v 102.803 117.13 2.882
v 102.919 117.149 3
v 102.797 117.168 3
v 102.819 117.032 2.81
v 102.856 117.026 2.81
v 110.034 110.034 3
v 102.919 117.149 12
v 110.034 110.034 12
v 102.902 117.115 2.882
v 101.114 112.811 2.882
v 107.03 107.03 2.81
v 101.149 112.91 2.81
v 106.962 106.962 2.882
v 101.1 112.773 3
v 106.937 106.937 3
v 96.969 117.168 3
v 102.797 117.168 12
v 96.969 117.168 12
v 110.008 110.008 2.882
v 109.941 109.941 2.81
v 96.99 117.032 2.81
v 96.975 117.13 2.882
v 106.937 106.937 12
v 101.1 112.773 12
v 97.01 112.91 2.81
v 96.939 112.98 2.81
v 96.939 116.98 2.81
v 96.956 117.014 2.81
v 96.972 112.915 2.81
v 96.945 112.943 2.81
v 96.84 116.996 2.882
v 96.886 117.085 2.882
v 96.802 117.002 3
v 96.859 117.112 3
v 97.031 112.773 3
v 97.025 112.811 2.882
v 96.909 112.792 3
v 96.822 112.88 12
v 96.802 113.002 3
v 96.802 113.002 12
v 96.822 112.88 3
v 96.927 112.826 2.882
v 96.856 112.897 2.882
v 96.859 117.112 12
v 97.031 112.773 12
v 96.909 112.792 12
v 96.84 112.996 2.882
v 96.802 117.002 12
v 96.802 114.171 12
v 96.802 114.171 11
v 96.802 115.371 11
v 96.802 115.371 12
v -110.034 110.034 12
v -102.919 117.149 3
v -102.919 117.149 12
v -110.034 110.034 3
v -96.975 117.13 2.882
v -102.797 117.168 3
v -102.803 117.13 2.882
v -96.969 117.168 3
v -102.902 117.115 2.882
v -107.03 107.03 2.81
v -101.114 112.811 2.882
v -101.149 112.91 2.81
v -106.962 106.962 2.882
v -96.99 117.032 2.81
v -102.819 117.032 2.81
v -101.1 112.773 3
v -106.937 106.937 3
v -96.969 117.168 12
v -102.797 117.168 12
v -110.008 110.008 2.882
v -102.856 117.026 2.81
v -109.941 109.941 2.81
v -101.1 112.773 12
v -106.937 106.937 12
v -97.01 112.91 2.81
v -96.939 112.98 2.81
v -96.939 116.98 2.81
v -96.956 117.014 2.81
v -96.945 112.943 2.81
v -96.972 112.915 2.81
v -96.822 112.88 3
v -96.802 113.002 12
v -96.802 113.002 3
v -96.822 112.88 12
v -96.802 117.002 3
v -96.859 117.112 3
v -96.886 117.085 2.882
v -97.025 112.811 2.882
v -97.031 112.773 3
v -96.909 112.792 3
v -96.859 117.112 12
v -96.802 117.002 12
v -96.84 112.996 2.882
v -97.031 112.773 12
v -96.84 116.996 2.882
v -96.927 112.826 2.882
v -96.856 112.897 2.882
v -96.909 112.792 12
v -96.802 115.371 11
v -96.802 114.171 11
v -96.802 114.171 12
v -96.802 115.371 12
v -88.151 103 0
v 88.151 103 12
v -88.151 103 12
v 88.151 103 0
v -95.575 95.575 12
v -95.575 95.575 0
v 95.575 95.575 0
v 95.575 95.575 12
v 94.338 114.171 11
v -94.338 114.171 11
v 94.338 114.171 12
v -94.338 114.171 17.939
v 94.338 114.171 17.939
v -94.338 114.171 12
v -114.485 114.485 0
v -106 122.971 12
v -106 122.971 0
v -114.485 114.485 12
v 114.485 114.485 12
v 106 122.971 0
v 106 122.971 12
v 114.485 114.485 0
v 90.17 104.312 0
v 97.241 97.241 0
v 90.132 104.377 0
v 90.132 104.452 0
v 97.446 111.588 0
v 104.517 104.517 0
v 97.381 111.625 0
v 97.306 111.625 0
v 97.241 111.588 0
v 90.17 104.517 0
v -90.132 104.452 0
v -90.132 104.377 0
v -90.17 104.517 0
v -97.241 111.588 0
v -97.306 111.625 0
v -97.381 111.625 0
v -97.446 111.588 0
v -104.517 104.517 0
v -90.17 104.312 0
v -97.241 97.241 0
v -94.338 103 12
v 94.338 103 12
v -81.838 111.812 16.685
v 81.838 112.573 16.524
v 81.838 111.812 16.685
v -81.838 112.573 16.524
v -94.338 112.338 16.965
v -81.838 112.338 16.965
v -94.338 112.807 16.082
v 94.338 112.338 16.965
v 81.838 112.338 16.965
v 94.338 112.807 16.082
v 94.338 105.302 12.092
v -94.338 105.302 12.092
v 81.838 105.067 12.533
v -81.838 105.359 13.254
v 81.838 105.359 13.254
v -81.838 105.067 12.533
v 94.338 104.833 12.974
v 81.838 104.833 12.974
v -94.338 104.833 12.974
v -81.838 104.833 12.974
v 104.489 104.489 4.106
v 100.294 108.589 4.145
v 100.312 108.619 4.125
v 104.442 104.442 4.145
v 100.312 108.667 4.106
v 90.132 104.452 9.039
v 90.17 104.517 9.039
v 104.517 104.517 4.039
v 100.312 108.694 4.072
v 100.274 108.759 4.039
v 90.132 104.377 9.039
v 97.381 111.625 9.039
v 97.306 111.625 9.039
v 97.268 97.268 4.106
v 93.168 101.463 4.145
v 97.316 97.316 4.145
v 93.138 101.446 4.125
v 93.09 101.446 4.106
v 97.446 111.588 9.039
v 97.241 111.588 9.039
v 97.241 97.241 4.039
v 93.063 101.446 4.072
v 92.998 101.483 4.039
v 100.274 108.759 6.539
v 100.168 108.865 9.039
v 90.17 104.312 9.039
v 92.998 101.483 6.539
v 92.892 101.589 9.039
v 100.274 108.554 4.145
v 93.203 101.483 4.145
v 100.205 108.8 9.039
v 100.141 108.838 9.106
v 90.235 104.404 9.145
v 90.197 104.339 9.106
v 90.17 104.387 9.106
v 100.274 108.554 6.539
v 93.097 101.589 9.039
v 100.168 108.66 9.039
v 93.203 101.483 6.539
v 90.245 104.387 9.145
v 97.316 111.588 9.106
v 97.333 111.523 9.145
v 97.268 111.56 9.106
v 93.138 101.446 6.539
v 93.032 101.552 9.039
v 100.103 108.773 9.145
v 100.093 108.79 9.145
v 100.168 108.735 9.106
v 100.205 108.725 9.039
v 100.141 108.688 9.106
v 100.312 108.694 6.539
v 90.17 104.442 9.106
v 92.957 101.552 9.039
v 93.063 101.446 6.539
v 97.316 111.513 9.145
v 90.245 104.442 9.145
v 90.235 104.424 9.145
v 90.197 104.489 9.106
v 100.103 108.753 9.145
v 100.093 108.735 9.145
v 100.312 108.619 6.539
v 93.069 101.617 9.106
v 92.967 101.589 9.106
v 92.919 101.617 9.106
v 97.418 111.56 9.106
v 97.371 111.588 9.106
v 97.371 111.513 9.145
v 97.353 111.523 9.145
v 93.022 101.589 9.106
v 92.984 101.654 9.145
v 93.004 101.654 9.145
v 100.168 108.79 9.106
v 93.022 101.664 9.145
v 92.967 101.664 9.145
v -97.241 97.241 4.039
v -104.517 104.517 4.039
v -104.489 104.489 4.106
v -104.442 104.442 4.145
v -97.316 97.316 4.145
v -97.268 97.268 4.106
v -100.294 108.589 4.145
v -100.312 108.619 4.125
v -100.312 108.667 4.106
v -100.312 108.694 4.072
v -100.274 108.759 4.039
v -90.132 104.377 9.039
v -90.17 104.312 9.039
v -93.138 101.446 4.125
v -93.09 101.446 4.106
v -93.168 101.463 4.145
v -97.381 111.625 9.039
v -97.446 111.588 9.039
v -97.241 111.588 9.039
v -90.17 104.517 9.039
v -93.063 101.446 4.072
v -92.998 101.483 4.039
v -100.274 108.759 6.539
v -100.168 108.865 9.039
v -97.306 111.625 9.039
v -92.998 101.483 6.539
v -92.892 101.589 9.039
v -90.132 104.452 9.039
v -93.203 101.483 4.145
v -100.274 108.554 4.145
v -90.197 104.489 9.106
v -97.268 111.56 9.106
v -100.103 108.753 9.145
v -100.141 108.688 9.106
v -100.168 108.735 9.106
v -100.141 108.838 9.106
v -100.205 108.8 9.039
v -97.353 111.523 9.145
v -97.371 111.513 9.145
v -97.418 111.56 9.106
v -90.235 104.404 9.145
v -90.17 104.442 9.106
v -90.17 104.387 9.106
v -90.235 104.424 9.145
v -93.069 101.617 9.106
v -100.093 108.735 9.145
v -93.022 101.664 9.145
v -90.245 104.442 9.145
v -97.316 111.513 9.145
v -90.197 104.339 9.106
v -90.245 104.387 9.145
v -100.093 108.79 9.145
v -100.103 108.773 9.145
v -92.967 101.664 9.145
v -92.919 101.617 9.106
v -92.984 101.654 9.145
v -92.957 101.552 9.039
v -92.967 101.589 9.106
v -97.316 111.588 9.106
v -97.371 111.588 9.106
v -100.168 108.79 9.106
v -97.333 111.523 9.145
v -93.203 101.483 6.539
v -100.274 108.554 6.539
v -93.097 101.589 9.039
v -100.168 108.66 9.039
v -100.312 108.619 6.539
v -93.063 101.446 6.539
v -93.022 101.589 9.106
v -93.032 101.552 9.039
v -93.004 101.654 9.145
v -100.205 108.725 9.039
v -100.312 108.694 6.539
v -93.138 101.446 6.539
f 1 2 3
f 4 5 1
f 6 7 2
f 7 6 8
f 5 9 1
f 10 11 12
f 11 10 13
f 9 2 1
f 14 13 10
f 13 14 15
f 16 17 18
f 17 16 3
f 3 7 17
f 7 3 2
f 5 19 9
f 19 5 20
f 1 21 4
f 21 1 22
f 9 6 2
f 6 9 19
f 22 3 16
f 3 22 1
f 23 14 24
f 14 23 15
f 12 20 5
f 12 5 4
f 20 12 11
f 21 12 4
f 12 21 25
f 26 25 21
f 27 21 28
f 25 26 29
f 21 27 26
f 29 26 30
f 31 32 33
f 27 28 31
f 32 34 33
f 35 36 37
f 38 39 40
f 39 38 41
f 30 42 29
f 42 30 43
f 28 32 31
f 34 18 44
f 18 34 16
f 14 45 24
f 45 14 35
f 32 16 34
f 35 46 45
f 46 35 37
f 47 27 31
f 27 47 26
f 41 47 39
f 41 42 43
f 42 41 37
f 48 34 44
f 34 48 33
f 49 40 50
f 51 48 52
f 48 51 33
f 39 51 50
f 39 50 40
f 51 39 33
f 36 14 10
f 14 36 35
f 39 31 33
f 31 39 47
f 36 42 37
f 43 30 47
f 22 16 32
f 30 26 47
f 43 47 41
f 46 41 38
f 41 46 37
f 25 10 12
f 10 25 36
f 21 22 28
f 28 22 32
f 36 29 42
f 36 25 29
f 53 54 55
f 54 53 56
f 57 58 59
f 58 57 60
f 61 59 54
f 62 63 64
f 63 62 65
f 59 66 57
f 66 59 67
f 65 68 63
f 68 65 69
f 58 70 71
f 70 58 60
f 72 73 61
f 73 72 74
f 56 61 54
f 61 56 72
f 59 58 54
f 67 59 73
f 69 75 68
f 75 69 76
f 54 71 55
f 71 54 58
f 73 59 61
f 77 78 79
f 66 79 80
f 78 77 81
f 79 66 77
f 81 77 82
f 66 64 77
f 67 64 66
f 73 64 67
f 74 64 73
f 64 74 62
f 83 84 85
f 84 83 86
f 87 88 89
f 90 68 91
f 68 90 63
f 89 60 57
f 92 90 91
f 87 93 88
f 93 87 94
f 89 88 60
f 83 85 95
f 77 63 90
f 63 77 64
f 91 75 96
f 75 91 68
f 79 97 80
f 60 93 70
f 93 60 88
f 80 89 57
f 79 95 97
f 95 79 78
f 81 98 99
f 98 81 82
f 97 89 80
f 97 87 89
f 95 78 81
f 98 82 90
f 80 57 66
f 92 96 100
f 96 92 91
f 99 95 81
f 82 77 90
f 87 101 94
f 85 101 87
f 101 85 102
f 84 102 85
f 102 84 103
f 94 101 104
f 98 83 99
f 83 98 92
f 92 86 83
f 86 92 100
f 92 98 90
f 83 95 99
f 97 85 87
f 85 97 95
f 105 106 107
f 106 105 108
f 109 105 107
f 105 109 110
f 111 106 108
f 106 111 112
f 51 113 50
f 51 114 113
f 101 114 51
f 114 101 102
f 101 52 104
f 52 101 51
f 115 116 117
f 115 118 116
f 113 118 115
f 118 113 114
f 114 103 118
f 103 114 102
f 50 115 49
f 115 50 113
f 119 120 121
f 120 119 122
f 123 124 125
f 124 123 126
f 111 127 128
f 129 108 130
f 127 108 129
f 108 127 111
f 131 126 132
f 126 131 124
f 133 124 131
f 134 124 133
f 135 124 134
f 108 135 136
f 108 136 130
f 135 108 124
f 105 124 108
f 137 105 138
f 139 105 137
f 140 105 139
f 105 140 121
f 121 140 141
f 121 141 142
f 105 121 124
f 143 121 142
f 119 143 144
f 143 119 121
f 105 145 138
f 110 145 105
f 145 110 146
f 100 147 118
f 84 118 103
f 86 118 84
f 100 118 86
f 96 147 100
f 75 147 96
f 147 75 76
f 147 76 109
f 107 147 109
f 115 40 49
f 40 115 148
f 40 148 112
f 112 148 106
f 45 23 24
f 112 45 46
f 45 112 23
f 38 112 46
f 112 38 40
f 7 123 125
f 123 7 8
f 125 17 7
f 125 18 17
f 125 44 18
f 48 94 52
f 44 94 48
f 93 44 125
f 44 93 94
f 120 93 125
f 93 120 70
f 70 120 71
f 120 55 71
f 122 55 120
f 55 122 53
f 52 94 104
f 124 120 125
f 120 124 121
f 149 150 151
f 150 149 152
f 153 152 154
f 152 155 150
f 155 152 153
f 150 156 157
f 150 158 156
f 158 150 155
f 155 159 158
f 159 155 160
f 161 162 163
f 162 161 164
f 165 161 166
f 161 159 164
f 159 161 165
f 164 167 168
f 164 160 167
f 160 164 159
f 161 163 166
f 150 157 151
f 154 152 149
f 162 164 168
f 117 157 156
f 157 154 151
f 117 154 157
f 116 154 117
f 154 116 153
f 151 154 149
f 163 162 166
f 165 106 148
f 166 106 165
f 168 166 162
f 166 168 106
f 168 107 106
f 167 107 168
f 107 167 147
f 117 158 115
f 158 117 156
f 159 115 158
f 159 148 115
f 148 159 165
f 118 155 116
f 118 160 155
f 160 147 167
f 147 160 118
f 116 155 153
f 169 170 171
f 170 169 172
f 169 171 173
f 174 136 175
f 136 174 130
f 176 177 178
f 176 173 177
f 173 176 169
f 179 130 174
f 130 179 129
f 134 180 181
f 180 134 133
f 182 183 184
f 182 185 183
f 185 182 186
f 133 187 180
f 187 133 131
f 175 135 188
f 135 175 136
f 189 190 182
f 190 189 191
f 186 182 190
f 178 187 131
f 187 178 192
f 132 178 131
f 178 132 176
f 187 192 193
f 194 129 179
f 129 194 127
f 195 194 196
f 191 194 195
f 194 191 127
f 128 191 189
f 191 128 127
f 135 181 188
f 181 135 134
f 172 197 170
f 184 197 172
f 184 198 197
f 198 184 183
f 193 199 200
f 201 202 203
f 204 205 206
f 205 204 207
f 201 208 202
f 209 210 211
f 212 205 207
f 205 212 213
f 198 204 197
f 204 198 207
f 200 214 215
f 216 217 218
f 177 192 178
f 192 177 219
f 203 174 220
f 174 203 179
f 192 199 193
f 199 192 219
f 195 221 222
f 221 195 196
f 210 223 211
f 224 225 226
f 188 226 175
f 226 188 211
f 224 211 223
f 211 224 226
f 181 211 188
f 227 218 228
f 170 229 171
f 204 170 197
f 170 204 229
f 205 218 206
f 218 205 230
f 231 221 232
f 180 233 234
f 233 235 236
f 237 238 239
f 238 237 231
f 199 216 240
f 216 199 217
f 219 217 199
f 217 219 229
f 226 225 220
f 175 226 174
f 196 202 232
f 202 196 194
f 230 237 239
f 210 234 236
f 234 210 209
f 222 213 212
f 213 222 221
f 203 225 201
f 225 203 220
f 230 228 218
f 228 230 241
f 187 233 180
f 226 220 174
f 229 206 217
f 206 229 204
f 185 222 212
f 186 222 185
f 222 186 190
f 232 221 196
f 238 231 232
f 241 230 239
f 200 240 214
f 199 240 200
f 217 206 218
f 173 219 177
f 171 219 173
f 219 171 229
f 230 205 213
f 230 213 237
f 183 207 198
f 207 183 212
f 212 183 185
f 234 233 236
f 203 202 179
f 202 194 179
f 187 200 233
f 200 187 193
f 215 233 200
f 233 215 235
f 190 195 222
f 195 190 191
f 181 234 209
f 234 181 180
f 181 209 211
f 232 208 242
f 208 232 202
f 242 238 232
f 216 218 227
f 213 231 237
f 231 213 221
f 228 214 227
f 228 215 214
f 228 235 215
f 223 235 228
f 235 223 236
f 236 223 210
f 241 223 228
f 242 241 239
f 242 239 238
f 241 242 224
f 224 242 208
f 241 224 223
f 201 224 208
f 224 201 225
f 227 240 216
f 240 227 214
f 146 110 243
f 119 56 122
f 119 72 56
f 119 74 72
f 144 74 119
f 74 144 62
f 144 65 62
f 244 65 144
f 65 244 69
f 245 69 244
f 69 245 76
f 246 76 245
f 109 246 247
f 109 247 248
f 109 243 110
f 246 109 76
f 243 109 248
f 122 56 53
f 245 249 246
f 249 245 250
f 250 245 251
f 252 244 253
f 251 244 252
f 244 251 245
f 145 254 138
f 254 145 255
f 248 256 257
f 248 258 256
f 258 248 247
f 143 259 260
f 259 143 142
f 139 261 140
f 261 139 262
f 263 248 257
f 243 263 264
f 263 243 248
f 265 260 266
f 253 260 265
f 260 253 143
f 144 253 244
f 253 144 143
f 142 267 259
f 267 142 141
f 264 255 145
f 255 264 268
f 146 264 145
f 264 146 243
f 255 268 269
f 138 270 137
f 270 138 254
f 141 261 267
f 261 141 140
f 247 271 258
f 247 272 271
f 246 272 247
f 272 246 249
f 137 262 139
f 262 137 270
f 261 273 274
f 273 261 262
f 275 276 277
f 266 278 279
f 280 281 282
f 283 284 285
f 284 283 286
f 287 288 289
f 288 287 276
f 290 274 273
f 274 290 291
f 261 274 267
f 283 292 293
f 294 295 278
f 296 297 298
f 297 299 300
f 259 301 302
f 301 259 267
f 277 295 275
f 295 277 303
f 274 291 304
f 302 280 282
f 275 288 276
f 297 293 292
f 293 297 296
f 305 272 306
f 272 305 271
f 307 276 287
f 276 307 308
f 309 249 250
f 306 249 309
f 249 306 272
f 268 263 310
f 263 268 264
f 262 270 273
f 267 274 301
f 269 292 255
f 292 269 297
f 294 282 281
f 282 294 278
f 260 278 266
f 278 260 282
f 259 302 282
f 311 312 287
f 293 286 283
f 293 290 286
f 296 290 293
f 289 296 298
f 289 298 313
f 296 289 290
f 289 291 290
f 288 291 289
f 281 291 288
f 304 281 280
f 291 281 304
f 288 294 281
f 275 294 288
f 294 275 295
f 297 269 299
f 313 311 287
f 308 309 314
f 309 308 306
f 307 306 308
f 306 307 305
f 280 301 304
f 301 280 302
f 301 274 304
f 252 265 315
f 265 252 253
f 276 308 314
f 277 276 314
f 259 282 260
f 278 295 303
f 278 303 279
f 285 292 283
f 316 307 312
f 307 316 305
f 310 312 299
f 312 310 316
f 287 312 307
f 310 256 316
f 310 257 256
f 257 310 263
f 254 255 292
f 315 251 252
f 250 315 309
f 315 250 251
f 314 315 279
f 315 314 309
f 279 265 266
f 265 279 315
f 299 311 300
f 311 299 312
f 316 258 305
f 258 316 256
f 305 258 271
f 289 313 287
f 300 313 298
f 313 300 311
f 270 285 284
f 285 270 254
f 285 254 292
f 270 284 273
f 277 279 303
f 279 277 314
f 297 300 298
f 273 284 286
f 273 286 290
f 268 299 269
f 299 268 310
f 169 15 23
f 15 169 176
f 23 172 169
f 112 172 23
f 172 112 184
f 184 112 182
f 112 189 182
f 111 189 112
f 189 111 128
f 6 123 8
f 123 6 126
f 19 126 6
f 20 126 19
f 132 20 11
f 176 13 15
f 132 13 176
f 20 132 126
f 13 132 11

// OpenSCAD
strip_thickness_mm = 0.5;
strip_width_mm = 8.5;
strip_retention_wall_mm = 1.5;
strip_retention_wall_angle = 40;
strip_separation_mm = 1;
strip_depth_mm = 1;
bracket_width_mm = strip_width_mm * 2 + 3 * strip_separation_mm;
bracket_depth_mm = 4;
mirror_thickness_mm = 1.2;
mirror_retention_depth_mm = 3;
mirror_retention_inset_mm = 1.2;
slot_tolerance_mm = 0.4;
mirror_width_mm = 200;

mirror_retention_block_width_mm = mirror_retention_depth_mm + bracket_depth_mm / sqrt(2);
corner_piece_offset_mm = bracket_width_mm / 2 - bracket_depth_mm / 2 + (mirror_retention_block_width_mm - mirror_retention_depth_mm) * sqrt(2);
corner_piece_inset_mm = 6;
floor_inset_mm = 38;
base_chamfer_height_mm = 12;
top_corner_chamfer_mm = 12;
top_pin_area_mm = 21;
corner_piece_hole_depth_mm = 8;
lid_retention_thickness_mm = 2.5;
floor_size_mm = 201;
ceiling_size_mm = floor_size_mm + 2 * lid_retention_thickness_mm;
top_thickness_mm = corner_piece_hole_depth_mm + 4;

horizontal_bracket_length_mm = 7.625 * 25.4;
horizontal_bracket_retention_width_mm = 6 * 25.4;
horizontal_bracket_retention_wall_thickness_mm = 2.5;
horizontal_bracket_retention_tolerance_mm = 0.3;

pin_width_mm = 10;
pin_depth_mm = 8;
pin_inset_mm = 10;
pin_thickness_mm = 4;
pin_top_thickness_mm = 3;
pin_insertion_easing_mm = 0.6;

pin_insertion_depth_mm = pin_depth_mm - pin_top_thickness_mm;
pin_insertion_tolerance_mm = 0.3;

pin_insertion_extra_mm = 1;

module strip_retention(side, height_mm, top_escape_mm, bottom_escape_mm, strip_depth_mm = strip_depth_mm)
{
  strip_offset = 0.5 * (strip_width_mm + strip_separation_mm);

  translate([side * strip_offset, -0.5 * bracket_depth_mm + 0.5 * strip_thickness_mm + strip_depth_mm, 0])
  {
    translate([0, 0, height_mm * 0.5])
    cube([strip_width_mm, strip_thickness_mm, height_mm + 5], center = true);

    translate([0, -0.5 * bracket_depth_mm, height_mm * 0.5])
    cube([strip_width_mm - 2 * strip_retention_wall_mm, bracket_depth_mm, height_mm + 5], center = true);

    difference()
    {
      union()
      for (j = [-1, 1])
      {
        intersection()
        {
          translate([j * (0.5 * strip_width_mm - 0.5 * strip_retention_wall_mm), 0.5 * strip_retention_wall_mm - 0.5 * strip_thickness_mm, height_mm * 0.5])
          multmatrix(
            [[1, 0, 0, 0],
             [j * strip_retention_wall_skew_factor, 1, 0, -0.5 * strip_retention_wall_x_mm],
             [0, 0, 1, 0],
             [0, 0, 0, 1]])
          cube([strip_retention_wall_mm + 0.1, strip_retention_wall_mm, height_mm + 10], center = true);

          translate([0, -3 * bracket_depth_mm + 0.5 * strip_thickness_mm, height_mm * 0.5 + 10])
          cube([strip_width_mm, 6 * bracket_depth_mm, height_mm + 20], center = true);
        }
      }

      translate([0, 3 * bracket_depth_mm + 0.5 * strip_thickness_mm, 0])
      cube([5 * strip_width_mm, 6 * bracket_depth_mm, 5 * height_mm], center = true);
    }

    translate([-side * 0.25 * strip_width_mm, -1.5 * strip_thickness_mm, height_mm - 0.5 * top_escape_mm])
    cube([strip_width_mm, 2 * strip_thickness_mm, top_escape_mm], center = true);

    translate([-side * 0.25 * strip_width_mm, -1.5 * strip_thickness_mm, 0.5 * bottom_escape_mm])
    cube([strip_width_mm, 2 * strip_thickness_mm, bottom_escape_mm], center = true);
  }
}

module pin()
{
  difference()
  {
    cube([2 * pin_inset_mm, pin_width_mm, pin_depth_mm], center = true);
    
    translate([0, 0, -pin_top_thickness_mm])
    cube([2 * pin_inset_mm - 2 * pin_thickness_mm, pin_width_mm * 2, pin_depth_mm], center = true);

    for (i = [-1, 1])
    {
      translate([-i * (pin_inset_mm - pin_thickness_mm * 1.5), 0, 0.5 * pin_insertion_depth_mm - 0.5 * pin_depth_mm])
      multmatrix(
        [[1, 0, i * pin_insertion_easing_mm / (2 * pin_insertion_depth_mm), 0],
         [0, 1, 0, 0],
         [0, 0, 1, 0],
         [0, 0, 0, 1]])
      cube([pin_thickness_mm, 2 * pin_width_mm, pin_insertion_depth_mm], center = true);
    }
  }
}

strip_retention_wall_skew_factor = tan(strip_retention_wall_angle);
strip_retention_wall_x_mm = strip_retention_wall_mm * strip_retention_wall_skew_factor;

module profile(height_mm)
{
  translate([0, 0, height_mm * 0.5])
  cube([bracket_width_mm, bracket_depth_mm, height_mm], center = true);

  for (i = [-1, 1])
  {
    scale([-i, 1, 1])
    intersection()
    {
      translate([-bracket_width_mm / 2, 0, 0])
      translate([bracket_depth_mm / sqrt(2) / 2, bracket_depth_mm * (1 - sqrt(2) / 2) / 2, 0.5 * height_mm])
      rotate([0, 0, 45])
      difference()
      {
        translate([-0.5 * mirror_retention_block_width_mm, 0, 0])
        cube([mirror_retention_block_width_mm, bracket_depth_mm, height_mm], center = true);
      }

      union()
      {
        translate([-3.5 * bracket_width_mm, 0, 0])
        cube([6 * bracket_width_mm, 6 * bracket_width_mm, 4 * height_mm], center = true);

        translate([0, -3.5 * bracket_depth_mm, 0])
        cube([4 * bracket_width_mm, 6 * bracket_depth_mm, 4 * height_mm], center = true);
      }
    }
  }
}

base_chamfer_generation_side_mm = mirror_width_mm + corner_piece_offset_mm * sqrt(2) * 2 + corner_piece_inset_mm * 2 + top_thickness_mm * 2;
base_side_mm = mirror_width_mm + corner_piece_offset_mm * sqrt(2) * 2 + corner_piece_inset_mm * 2 + base_chamfer_height_mm * 2;
top_side_mm = mirror_width_mm + corner_piece_offset_mm * sqrt(2) * 2 + corner_piece_inset_mm * 2;

strip_retention_angle = 28;

strip_retention_min_mm = ceiling_size_mm * 0.5;
strip_retention_max_mm = mirror_width_mm * 0.5 + corner_piece_offset_mm * sqrt(2) - bracket_depth_mm + mirror_retention_inset_mm;
strip_retention_width_mm = strip_retention_max_mm - strip_retention_min_mm;

strip_retention_width_flat_mm = strip_retention_width_mm / cos(strip_retention_angle);

echo(base_chamfer_generation_side_mm);

module top()
{
  union()
  {
    difference()
    {
      linear_extrude(height = top_thickness_mm)
      square(top_side_mm, center = true);

      color("red")
      for (i = [1 : 4])
      {
        rotate([0, 0, 45 + 90 * i])
        translate([0, mirror_width_mm / sqrt(2) + corner_piece_offset_mm, top_thickness_mm - corner_piece_hole_depth_mm + slot_tolerance_mm / 2 - mirror_retention_inset_mm])
        minkowski()
        {
          profile(corner_piece_hole_depth_mm + 1 + mirror_retention_inset_mm);
          sphere(d = slot_tolerance_mm, $fn = 10);
        }
      }

      translate([0, 0, -1])
      intersection()
      {
        linear_extrude(top_thickness_mm + 2)
        square(ceiling_size_mm, center = true);

        rotate([0, 0, 45])
        linear_extrude(top_thickness_mm + 2)
        square(ceiling_size_mm * sqrt(2) - top_pin_area_mm, center = true);
      }

      for (i = [0 : 3])
        rotate([0, 0, i * 90])
        {
          color("teal")
          translate([0, mirror_width_mm * 0.5 + corner_piece_offset_mm * sqrt(2) + mirror_thickness_mm / 2 - bracket_depth_mm + mirror_retention_inset_mm, top_thickness_mm])
          cube([mirror_width_mm, mirror_thickness_mm, 2], center = true);
        }

      for (i = [0 : 3])
        rotate([0, 0, 45 + i * 90])
        translate([0, 0.5 * mirror_width_mm + top_side_mm * sqrt(2) / 2 - top_corner_chamfer_mm, 0.5 * top_thickness_mm])
        cube([mirror_width_mm, mirror_width_mm, 2 * top_thickness_mm], center = true);
    }

    for (i = [0 : 3])
    {
      rotate([0, 0, i * 90])
      translate([0, strip_retention_min_mm, top_thickness_mm])
      difference()
      {
        multmatrix(
          [[1, 0, 0, 0],
           [0, 1, 0, 0],
           [0, tan(strip_retention_angle), 1, 0],
           [0, 0, 0, 1]])
        translate([0, 0.5 * strip_retention_width_mm, -0.5 * top_thickness_mm])
        cube([horizontal_bracket_length_mm - 5, strip_retention_width_mm, top_thickness_mm], center = true);

        color("green")
        rotate([strip_retention_angle - 90, 0, 0])
        translate([0, strip_depth_mm, 0])
        translate([0, strip_thickness_mm - strip_depth_mm + 0.5 * strip_thickness_mm, 0.5 * strip_retention_width_flat_mm])
        translate([-0.5 * horizontal_bracket_length_mm, 0, 0])
        rotate([0, 90, 0])
        strip_retention(0, horizontal_bracket_length_mm, 15, 15, 1.75);
      }
    }
  }
}

module top_segment()
{
  difference()
  {
    top();

    for (i = [-45, 45])
    {
      rotate([0, 0, i])
      {
        translate([0, -base_side_mm, 0])
        cube([base_side_mm * 2, base_side_mm * 2, top_thickness_mm * 3], center = true);

        color("green")
        translate([0, (top_side_mm / 2 - (top_side_mm - ceiling_size_mm) / 2) * sqrt(2) - 3, 0.5 * pin_depth_mm + pin_insertion_extra_mm])
        rotate([180, 0, 0])
        minkowski()
        {
          union()
          {
            pin();

            translate([0, 0, pin_depth_mm])
            cube([2 * pin_inset_mm, pin_width_mm, pin_depth_mm], center = true);
          }

          sphere(d = pin_insertion_tolerance_mm, $fn = 12);
        }
      }
    }
  }
}

//top();
top_segment();
//pin();
